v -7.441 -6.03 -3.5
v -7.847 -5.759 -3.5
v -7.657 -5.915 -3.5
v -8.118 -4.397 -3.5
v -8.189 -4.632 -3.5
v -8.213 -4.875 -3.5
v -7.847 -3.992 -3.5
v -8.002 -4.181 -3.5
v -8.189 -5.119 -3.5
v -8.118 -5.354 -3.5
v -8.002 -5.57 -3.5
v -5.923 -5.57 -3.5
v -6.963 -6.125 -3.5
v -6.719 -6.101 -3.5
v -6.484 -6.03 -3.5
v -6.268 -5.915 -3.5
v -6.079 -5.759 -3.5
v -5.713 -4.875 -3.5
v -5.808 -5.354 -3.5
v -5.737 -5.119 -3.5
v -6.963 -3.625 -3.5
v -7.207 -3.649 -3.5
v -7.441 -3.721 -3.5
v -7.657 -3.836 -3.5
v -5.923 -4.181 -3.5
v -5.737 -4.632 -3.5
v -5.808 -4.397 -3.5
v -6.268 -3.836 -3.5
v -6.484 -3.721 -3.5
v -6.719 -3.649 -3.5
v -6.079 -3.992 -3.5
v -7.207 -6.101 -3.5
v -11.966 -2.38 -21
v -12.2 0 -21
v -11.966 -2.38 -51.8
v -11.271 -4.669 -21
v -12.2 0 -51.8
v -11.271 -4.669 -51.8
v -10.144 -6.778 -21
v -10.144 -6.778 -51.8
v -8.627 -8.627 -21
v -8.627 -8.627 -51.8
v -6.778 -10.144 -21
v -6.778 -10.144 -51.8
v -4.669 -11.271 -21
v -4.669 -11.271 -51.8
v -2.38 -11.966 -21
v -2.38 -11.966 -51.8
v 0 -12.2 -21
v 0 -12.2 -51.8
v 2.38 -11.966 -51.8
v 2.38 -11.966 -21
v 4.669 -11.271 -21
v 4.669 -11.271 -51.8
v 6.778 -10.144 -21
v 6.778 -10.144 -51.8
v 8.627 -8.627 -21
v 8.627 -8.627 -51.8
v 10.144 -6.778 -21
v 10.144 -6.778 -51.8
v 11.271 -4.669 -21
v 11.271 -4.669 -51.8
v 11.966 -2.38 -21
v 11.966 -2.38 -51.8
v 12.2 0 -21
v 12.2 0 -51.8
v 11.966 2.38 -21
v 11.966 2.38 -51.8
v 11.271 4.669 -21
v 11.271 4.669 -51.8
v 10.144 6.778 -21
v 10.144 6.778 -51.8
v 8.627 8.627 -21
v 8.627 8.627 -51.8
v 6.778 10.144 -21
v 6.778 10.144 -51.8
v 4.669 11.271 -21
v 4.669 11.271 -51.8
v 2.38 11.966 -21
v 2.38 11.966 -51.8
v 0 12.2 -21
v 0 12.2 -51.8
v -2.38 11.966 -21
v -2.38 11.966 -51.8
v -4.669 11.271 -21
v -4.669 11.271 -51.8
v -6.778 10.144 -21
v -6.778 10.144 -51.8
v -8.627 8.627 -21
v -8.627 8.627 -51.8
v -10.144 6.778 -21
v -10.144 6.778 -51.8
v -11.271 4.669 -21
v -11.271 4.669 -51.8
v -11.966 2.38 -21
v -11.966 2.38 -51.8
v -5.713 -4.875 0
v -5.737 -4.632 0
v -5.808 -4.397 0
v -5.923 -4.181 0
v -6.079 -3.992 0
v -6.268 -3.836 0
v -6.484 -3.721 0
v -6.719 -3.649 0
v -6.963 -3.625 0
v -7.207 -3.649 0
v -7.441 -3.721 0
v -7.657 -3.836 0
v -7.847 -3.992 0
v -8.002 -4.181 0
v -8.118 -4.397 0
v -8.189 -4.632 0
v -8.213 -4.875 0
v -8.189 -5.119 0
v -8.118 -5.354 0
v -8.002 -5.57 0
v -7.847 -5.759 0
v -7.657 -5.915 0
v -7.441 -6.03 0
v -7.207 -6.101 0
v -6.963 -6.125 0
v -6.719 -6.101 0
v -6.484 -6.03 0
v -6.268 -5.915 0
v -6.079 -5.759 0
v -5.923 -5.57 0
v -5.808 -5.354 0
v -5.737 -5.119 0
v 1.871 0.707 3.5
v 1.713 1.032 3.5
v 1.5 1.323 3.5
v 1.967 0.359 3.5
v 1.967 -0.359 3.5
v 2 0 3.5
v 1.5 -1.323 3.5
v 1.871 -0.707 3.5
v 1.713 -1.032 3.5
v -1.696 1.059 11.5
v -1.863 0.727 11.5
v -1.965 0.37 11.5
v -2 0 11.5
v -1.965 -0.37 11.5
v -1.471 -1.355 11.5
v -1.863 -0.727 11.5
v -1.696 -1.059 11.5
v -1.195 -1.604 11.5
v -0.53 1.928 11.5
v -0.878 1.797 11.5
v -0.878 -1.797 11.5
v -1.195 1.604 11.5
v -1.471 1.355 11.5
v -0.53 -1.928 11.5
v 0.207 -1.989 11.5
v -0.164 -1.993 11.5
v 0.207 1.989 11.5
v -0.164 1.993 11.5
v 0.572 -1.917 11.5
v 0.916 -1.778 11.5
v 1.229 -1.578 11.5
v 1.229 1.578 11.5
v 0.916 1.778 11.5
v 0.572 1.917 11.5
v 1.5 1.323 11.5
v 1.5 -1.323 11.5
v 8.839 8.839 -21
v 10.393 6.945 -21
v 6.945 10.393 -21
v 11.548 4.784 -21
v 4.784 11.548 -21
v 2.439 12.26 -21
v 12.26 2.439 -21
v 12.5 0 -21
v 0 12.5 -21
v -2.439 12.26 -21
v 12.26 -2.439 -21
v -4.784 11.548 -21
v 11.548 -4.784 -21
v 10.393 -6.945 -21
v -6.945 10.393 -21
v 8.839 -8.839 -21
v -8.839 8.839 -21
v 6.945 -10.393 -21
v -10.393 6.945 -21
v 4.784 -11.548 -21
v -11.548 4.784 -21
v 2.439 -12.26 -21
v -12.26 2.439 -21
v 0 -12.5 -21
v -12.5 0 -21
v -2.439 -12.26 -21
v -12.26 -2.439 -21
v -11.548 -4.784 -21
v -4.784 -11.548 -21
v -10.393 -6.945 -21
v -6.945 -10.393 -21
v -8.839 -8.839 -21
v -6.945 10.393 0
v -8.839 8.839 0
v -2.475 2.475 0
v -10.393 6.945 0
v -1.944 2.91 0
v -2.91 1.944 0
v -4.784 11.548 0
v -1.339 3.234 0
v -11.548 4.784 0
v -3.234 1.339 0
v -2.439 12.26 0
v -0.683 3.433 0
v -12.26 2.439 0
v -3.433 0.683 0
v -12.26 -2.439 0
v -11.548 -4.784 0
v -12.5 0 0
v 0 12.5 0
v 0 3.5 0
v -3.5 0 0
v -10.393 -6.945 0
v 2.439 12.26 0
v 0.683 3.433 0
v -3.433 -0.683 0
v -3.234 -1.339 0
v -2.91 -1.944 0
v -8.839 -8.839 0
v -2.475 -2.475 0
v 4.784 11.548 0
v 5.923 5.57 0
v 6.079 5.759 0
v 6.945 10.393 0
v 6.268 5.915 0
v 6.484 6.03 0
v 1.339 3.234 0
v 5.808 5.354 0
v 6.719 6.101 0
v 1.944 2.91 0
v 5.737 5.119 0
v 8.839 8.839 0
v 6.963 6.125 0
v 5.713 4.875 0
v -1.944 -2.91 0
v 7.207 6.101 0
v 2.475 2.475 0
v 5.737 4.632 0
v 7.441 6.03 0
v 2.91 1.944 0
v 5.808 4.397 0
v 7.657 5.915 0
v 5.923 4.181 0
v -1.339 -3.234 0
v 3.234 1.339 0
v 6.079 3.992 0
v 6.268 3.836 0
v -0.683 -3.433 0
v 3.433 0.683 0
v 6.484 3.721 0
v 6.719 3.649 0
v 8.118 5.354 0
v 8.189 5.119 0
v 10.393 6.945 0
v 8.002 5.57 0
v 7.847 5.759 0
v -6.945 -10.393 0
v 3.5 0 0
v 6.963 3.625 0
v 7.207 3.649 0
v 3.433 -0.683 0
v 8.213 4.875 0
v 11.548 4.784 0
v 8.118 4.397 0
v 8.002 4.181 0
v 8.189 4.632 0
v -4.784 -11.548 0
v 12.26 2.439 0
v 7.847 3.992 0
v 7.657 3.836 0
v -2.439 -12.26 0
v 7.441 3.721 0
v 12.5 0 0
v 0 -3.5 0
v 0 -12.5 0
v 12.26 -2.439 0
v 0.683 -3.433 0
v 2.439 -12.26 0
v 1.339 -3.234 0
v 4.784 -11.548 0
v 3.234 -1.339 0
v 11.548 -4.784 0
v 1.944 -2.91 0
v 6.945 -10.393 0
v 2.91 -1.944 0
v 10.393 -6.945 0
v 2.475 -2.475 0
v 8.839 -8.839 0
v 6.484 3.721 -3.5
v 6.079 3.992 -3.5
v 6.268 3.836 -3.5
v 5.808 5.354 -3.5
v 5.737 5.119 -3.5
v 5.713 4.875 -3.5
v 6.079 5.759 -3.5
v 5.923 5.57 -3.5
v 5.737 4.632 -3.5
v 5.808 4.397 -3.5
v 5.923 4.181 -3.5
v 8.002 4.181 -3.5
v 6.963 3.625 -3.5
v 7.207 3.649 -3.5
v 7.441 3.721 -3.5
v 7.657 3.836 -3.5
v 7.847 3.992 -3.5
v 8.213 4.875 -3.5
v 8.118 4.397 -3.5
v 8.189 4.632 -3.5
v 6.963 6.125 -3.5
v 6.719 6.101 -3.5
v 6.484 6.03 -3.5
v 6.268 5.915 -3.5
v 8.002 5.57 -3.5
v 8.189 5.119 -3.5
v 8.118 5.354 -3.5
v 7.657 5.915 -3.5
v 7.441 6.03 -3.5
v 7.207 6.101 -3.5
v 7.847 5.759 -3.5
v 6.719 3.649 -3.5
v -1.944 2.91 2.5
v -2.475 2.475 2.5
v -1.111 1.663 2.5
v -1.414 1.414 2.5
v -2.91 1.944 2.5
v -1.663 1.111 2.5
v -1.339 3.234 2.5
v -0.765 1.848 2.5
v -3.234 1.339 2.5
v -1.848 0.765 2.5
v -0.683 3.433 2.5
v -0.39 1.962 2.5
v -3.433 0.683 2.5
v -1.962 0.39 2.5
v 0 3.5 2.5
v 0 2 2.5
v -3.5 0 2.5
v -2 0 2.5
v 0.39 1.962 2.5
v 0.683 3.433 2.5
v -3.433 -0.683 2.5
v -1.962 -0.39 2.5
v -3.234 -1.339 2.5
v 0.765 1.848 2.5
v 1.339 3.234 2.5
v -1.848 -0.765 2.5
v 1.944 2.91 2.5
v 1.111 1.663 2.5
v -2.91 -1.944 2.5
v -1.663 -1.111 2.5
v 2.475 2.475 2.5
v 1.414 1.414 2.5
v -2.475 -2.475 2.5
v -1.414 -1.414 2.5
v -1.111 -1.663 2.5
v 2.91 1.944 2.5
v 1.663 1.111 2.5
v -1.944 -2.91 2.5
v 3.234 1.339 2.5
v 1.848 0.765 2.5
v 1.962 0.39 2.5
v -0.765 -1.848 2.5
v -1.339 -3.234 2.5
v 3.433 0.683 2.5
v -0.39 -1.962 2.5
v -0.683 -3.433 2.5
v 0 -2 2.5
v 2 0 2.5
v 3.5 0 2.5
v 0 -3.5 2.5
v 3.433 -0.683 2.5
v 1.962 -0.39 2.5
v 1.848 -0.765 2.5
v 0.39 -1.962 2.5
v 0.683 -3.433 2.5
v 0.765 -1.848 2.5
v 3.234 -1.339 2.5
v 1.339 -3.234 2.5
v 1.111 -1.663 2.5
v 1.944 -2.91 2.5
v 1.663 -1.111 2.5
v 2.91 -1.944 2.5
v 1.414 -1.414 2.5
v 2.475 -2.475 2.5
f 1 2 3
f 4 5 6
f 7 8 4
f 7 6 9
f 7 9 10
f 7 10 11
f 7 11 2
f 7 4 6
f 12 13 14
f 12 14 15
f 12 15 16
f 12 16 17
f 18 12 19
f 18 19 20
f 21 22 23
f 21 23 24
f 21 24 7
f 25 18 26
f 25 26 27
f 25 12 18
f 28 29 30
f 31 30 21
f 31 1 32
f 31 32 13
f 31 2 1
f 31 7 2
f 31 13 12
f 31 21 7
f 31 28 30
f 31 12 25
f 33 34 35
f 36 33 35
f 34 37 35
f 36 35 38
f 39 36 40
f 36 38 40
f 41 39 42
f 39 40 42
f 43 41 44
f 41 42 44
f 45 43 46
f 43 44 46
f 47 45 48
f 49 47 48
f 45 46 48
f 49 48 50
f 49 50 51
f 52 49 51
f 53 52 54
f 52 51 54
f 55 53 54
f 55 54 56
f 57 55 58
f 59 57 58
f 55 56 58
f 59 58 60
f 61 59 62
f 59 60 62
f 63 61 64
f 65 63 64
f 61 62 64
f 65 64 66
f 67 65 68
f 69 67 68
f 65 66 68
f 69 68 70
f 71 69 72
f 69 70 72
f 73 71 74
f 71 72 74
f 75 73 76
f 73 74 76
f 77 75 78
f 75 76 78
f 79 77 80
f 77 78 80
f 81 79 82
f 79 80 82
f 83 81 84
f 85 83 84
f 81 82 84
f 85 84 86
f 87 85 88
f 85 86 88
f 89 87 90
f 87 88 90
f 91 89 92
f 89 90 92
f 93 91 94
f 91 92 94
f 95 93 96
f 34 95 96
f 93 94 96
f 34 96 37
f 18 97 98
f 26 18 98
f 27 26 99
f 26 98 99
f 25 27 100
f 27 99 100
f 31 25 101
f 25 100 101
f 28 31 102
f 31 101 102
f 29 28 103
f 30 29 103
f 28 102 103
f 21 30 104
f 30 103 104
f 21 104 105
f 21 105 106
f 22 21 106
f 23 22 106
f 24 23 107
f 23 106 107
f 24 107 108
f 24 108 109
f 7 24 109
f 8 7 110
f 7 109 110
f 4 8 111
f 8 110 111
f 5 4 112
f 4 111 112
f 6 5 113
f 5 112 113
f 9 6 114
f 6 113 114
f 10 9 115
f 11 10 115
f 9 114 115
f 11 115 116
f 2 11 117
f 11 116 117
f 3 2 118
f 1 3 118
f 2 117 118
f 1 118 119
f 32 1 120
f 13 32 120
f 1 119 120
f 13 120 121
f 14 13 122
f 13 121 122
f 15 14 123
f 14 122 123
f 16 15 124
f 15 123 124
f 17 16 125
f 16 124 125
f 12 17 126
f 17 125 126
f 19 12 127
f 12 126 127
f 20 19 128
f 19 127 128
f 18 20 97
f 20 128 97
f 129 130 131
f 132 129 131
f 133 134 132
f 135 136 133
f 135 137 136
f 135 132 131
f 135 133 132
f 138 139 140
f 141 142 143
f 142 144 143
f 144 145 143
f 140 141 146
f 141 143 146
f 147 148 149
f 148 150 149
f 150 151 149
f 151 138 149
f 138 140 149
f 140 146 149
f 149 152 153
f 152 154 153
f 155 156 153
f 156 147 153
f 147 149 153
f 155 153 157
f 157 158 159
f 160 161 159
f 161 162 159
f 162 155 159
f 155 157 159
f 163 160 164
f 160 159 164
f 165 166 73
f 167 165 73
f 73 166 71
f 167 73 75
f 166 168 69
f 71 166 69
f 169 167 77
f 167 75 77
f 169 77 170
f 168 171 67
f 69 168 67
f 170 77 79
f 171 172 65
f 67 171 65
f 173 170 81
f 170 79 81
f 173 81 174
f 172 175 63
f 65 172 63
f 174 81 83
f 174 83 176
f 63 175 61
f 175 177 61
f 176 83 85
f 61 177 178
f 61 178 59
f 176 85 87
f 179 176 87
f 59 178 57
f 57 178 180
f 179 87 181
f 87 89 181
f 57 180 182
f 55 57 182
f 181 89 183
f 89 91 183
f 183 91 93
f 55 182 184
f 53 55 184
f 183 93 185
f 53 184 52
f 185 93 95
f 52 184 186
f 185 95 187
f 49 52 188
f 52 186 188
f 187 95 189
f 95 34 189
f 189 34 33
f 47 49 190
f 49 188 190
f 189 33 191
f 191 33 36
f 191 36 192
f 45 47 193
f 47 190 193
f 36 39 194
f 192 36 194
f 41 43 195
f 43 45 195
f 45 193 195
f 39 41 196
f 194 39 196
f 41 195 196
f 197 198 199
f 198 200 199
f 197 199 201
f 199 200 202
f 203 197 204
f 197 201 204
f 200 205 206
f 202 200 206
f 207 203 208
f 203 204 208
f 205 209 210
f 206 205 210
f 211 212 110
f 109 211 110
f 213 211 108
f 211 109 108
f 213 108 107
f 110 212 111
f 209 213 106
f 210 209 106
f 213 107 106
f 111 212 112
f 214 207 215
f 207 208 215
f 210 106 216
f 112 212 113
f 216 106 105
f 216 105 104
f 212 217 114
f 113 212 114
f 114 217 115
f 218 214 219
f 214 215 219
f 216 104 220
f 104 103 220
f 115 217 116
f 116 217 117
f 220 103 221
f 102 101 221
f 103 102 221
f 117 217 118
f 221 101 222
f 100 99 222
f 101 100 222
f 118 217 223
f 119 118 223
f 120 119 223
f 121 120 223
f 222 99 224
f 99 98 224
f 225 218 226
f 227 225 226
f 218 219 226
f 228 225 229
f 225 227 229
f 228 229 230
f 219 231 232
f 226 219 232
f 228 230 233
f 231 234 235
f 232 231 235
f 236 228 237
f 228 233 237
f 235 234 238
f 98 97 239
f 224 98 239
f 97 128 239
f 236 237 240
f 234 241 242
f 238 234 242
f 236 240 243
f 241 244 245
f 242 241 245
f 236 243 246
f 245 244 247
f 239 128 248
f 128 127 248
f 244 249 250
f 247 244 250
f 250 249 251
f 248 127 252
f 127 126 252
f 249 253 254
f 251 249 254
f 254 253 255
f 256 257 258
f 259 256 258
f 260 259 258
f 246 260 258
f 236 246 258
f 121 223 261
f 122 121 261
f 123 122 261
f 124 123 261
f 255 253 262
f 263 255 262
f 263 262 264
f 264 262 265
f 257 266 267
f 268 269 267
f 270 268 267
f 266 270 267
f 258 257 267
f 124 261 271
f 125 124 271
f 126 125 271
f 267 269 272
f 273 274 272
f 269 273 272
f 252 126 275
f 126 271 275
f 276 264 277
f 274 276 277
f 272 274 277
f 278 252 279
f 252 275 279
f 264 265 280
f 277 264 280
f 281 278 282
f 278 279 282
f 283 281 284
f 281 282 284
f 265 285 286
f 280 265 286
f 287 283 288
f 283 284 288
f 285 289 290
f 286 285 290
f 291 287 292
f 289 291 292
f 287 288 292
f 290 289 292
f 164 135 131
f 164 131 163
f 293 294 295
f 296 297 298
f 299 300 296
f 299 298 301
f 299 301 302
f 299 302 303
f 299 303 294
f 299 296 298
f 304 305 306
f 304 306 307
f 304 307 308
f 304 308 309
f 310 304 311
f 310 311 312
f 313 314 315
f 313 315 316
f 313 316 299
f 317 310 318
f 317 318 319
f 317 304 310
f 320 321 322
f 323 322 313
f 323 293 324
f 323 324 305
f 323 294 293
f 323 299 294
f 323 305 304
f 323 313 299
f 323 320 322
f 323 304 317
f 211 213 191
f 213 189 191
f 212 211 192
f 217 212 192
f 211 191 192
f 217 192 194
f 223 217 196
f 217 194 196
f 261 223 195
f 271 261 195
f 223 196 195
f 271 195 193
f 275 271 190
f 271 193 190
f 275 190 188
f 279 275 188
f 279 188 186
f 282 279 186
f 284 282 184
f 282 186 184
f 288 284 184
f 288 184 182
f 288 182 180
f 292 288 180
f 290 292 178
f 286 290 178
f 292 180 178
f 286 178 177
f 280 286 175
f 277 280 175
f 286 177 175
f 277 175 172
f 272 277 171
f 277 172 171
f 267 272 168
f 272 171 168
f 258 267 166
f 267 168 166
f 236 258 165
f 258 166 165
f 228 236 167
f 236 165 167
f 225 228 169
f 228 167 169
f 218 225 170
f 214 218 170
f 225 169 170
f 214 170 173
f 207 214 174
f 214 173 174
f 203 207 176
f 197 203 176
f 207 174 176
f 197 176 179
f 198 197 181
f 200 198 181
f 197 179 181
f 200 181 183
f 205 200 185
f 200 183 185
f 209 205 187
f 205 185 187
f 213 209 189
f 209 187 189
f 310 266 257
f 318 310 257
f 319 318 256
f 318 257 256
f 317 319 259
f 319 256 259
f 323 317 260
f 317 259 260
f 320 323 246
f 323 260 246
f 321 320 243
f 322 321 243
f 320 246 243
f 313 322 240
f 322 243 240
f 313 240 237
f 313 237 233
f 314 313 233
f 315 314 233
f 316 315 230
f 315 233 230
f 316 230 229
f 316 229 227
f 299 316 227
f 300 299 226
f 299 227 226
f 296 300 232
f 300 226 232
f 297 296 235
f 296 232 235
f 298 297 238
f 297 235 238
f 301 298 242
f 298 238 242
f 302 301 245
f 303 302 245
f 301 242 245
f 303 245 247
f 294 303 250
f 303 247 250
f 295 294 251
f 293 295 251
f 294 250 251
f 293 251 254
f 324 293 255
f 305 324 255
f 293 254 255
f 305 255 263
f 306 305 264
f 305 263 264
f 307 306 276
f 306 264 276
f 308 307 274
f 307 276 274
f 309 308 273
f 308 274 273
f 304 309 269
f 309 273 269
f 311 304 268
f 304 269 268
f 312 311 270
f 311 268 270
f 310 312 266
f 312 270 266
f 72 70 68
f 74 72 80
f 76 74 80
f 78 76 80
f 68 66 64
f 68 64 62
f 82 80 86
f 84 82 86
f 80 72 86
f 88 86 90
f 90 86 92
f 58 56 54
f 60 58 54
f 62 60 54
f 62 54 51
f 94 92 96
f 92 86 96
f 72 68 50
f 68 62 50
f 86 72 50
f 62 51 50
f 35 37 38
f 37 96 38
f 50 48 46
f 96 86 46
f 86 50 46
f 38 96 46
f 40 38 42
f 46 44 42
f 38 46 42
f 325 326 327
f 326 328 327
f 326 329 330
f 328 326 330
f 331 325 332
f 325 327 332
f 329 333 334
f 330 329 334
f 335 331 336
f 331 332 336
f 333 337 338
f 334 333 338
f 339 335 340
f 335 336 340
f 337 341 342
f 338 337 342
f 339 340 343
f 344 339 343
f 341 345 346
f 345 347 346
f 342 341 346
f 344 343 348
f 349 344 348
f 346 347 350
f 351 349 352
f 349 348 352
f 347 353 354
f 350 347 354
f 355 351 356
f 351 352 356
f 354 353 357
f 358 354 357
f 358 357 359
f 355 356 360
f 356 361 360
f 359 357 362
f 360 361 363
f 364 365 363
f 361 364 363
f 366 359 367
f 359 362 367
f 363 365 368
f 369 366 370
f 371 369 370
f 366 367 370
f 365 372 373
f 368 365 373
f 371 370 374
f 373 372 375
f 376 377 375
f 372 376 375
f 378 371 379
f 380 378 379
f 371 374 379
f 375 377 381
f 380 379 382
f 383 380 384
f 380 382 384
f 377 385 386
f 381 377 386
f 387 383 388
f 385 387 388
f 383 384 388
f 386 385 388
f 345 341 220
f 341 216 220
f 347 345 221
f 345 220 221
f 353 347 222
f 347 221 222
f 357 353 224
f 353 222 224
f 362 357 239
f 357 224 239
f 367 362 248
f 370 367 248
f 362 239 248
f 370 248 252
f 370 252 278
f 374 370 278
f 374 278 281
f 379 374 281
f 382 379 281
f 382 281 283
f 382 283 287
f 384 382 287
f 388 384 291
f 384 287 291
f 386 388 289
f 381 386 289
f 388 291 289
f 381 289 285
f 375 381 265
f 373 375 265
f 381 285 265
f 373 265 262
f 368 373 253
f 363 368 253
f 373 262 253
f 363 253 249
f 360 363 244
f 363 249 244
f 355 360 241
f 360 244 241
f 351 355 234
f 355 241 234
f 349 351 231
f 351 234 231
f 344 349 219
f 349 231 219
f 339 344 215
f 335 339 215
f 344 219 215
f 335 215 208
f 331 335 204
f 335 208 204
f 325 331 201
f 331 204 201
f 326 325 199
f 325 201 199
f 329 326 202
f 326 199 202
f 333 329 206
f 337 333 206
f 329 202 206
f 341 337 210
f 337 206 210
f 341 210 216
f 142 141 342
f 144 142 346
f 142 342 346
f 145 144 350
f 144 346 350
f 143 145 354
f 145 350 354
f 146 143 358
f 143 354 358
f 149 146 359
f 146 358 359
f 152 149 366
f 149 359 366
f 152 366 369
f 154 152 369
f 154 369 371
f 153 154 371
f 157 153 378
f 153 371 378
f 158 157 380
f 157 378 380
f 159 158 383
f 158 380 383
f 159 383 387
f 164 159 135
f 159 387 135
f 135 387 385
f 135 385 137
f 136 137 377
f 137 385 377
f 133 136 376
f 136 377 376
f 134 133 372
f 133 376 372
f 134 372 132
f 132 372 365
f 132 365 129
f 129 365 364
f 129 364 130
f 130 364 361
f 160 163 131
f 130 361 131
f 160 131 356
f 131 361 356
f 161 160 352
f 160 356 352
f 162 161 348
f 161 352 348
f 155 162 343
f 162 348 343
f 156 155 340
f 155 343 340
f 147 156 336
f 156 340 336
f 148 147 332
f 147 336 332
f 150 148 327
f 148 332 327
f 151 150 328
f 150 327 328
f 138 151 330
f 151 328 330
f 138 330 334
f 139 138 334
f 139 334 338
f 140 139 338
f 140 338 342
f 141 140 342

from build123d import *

# Parameters (mm, degrees)
SHAFT_D_FLAT_DEPTH      = 55.733353634
SHAFT_D_FLAT_DEPTH_BACK = 55.733353634
SKETCH2_W               = 1.5
SKETCH2_H               = 8.5
SKETCH3_R               = 1.25
M3_MOUNTING_HOLES_DEPTH = 3.5


with BuildPart() as part:
    # Sketch1 → Motor Body (revolve)
    with BuildSketch(Plane(origin=(0, 0, 0), x_dir=(-1, 0, 0), z_dir=(0, 1, 0))):
        Polygon((0, 11.5), (-2, 11.5), (-2, 2.5), (-3.5, 2.5), (-3.5, 0), (-12.5, 0), (-12.5, -21), (-12.2, -21), (-12.2, -51.8), (0, -51.8), align=None)
    revolve(axis=Axis((0, 0, -60), (0, 0, 1)))

    # Sketch2 → Shaft D-Flat (cut, two sides: drawn at the far end of the back side and taken through both)
    with BuildSketch(Plane(origin=(0, 0, 0), x_dir=(-1, 0, 0), z_dir=(0, 1, 0)).offset(-SHAFT_D_FLAT_DEPTH_BACK)):
        with Locations((-2.25, 7.75)):
            Rectangle(SKETCH2_W, SKETCH2_H)
    extrude(amount=SHAFT_D_FLAT_DEPTH + SHAFT_D_FLAT_DEPTH_BACK, mode=Mode.SUBTRACT)

    # Sketch3 → M3 Mounting Holes (cut)
    with BuildSketch(Plane(origin=(0, 0, 0), x_dir=(0, 1, 0), z_dir=(0, 0, 1))):
        with Locations((4.875399709, -6.962792376)):
            Circle(SKETCH3_R)
        with Locations((-4.875399709, 6.962792376)):
            Circle(SKETCH3_R)
    extrude(amount=-M3_MOUNTING_HOLES_DEPTH, mode=Mode.SUBTRACT)


solid = part.part
